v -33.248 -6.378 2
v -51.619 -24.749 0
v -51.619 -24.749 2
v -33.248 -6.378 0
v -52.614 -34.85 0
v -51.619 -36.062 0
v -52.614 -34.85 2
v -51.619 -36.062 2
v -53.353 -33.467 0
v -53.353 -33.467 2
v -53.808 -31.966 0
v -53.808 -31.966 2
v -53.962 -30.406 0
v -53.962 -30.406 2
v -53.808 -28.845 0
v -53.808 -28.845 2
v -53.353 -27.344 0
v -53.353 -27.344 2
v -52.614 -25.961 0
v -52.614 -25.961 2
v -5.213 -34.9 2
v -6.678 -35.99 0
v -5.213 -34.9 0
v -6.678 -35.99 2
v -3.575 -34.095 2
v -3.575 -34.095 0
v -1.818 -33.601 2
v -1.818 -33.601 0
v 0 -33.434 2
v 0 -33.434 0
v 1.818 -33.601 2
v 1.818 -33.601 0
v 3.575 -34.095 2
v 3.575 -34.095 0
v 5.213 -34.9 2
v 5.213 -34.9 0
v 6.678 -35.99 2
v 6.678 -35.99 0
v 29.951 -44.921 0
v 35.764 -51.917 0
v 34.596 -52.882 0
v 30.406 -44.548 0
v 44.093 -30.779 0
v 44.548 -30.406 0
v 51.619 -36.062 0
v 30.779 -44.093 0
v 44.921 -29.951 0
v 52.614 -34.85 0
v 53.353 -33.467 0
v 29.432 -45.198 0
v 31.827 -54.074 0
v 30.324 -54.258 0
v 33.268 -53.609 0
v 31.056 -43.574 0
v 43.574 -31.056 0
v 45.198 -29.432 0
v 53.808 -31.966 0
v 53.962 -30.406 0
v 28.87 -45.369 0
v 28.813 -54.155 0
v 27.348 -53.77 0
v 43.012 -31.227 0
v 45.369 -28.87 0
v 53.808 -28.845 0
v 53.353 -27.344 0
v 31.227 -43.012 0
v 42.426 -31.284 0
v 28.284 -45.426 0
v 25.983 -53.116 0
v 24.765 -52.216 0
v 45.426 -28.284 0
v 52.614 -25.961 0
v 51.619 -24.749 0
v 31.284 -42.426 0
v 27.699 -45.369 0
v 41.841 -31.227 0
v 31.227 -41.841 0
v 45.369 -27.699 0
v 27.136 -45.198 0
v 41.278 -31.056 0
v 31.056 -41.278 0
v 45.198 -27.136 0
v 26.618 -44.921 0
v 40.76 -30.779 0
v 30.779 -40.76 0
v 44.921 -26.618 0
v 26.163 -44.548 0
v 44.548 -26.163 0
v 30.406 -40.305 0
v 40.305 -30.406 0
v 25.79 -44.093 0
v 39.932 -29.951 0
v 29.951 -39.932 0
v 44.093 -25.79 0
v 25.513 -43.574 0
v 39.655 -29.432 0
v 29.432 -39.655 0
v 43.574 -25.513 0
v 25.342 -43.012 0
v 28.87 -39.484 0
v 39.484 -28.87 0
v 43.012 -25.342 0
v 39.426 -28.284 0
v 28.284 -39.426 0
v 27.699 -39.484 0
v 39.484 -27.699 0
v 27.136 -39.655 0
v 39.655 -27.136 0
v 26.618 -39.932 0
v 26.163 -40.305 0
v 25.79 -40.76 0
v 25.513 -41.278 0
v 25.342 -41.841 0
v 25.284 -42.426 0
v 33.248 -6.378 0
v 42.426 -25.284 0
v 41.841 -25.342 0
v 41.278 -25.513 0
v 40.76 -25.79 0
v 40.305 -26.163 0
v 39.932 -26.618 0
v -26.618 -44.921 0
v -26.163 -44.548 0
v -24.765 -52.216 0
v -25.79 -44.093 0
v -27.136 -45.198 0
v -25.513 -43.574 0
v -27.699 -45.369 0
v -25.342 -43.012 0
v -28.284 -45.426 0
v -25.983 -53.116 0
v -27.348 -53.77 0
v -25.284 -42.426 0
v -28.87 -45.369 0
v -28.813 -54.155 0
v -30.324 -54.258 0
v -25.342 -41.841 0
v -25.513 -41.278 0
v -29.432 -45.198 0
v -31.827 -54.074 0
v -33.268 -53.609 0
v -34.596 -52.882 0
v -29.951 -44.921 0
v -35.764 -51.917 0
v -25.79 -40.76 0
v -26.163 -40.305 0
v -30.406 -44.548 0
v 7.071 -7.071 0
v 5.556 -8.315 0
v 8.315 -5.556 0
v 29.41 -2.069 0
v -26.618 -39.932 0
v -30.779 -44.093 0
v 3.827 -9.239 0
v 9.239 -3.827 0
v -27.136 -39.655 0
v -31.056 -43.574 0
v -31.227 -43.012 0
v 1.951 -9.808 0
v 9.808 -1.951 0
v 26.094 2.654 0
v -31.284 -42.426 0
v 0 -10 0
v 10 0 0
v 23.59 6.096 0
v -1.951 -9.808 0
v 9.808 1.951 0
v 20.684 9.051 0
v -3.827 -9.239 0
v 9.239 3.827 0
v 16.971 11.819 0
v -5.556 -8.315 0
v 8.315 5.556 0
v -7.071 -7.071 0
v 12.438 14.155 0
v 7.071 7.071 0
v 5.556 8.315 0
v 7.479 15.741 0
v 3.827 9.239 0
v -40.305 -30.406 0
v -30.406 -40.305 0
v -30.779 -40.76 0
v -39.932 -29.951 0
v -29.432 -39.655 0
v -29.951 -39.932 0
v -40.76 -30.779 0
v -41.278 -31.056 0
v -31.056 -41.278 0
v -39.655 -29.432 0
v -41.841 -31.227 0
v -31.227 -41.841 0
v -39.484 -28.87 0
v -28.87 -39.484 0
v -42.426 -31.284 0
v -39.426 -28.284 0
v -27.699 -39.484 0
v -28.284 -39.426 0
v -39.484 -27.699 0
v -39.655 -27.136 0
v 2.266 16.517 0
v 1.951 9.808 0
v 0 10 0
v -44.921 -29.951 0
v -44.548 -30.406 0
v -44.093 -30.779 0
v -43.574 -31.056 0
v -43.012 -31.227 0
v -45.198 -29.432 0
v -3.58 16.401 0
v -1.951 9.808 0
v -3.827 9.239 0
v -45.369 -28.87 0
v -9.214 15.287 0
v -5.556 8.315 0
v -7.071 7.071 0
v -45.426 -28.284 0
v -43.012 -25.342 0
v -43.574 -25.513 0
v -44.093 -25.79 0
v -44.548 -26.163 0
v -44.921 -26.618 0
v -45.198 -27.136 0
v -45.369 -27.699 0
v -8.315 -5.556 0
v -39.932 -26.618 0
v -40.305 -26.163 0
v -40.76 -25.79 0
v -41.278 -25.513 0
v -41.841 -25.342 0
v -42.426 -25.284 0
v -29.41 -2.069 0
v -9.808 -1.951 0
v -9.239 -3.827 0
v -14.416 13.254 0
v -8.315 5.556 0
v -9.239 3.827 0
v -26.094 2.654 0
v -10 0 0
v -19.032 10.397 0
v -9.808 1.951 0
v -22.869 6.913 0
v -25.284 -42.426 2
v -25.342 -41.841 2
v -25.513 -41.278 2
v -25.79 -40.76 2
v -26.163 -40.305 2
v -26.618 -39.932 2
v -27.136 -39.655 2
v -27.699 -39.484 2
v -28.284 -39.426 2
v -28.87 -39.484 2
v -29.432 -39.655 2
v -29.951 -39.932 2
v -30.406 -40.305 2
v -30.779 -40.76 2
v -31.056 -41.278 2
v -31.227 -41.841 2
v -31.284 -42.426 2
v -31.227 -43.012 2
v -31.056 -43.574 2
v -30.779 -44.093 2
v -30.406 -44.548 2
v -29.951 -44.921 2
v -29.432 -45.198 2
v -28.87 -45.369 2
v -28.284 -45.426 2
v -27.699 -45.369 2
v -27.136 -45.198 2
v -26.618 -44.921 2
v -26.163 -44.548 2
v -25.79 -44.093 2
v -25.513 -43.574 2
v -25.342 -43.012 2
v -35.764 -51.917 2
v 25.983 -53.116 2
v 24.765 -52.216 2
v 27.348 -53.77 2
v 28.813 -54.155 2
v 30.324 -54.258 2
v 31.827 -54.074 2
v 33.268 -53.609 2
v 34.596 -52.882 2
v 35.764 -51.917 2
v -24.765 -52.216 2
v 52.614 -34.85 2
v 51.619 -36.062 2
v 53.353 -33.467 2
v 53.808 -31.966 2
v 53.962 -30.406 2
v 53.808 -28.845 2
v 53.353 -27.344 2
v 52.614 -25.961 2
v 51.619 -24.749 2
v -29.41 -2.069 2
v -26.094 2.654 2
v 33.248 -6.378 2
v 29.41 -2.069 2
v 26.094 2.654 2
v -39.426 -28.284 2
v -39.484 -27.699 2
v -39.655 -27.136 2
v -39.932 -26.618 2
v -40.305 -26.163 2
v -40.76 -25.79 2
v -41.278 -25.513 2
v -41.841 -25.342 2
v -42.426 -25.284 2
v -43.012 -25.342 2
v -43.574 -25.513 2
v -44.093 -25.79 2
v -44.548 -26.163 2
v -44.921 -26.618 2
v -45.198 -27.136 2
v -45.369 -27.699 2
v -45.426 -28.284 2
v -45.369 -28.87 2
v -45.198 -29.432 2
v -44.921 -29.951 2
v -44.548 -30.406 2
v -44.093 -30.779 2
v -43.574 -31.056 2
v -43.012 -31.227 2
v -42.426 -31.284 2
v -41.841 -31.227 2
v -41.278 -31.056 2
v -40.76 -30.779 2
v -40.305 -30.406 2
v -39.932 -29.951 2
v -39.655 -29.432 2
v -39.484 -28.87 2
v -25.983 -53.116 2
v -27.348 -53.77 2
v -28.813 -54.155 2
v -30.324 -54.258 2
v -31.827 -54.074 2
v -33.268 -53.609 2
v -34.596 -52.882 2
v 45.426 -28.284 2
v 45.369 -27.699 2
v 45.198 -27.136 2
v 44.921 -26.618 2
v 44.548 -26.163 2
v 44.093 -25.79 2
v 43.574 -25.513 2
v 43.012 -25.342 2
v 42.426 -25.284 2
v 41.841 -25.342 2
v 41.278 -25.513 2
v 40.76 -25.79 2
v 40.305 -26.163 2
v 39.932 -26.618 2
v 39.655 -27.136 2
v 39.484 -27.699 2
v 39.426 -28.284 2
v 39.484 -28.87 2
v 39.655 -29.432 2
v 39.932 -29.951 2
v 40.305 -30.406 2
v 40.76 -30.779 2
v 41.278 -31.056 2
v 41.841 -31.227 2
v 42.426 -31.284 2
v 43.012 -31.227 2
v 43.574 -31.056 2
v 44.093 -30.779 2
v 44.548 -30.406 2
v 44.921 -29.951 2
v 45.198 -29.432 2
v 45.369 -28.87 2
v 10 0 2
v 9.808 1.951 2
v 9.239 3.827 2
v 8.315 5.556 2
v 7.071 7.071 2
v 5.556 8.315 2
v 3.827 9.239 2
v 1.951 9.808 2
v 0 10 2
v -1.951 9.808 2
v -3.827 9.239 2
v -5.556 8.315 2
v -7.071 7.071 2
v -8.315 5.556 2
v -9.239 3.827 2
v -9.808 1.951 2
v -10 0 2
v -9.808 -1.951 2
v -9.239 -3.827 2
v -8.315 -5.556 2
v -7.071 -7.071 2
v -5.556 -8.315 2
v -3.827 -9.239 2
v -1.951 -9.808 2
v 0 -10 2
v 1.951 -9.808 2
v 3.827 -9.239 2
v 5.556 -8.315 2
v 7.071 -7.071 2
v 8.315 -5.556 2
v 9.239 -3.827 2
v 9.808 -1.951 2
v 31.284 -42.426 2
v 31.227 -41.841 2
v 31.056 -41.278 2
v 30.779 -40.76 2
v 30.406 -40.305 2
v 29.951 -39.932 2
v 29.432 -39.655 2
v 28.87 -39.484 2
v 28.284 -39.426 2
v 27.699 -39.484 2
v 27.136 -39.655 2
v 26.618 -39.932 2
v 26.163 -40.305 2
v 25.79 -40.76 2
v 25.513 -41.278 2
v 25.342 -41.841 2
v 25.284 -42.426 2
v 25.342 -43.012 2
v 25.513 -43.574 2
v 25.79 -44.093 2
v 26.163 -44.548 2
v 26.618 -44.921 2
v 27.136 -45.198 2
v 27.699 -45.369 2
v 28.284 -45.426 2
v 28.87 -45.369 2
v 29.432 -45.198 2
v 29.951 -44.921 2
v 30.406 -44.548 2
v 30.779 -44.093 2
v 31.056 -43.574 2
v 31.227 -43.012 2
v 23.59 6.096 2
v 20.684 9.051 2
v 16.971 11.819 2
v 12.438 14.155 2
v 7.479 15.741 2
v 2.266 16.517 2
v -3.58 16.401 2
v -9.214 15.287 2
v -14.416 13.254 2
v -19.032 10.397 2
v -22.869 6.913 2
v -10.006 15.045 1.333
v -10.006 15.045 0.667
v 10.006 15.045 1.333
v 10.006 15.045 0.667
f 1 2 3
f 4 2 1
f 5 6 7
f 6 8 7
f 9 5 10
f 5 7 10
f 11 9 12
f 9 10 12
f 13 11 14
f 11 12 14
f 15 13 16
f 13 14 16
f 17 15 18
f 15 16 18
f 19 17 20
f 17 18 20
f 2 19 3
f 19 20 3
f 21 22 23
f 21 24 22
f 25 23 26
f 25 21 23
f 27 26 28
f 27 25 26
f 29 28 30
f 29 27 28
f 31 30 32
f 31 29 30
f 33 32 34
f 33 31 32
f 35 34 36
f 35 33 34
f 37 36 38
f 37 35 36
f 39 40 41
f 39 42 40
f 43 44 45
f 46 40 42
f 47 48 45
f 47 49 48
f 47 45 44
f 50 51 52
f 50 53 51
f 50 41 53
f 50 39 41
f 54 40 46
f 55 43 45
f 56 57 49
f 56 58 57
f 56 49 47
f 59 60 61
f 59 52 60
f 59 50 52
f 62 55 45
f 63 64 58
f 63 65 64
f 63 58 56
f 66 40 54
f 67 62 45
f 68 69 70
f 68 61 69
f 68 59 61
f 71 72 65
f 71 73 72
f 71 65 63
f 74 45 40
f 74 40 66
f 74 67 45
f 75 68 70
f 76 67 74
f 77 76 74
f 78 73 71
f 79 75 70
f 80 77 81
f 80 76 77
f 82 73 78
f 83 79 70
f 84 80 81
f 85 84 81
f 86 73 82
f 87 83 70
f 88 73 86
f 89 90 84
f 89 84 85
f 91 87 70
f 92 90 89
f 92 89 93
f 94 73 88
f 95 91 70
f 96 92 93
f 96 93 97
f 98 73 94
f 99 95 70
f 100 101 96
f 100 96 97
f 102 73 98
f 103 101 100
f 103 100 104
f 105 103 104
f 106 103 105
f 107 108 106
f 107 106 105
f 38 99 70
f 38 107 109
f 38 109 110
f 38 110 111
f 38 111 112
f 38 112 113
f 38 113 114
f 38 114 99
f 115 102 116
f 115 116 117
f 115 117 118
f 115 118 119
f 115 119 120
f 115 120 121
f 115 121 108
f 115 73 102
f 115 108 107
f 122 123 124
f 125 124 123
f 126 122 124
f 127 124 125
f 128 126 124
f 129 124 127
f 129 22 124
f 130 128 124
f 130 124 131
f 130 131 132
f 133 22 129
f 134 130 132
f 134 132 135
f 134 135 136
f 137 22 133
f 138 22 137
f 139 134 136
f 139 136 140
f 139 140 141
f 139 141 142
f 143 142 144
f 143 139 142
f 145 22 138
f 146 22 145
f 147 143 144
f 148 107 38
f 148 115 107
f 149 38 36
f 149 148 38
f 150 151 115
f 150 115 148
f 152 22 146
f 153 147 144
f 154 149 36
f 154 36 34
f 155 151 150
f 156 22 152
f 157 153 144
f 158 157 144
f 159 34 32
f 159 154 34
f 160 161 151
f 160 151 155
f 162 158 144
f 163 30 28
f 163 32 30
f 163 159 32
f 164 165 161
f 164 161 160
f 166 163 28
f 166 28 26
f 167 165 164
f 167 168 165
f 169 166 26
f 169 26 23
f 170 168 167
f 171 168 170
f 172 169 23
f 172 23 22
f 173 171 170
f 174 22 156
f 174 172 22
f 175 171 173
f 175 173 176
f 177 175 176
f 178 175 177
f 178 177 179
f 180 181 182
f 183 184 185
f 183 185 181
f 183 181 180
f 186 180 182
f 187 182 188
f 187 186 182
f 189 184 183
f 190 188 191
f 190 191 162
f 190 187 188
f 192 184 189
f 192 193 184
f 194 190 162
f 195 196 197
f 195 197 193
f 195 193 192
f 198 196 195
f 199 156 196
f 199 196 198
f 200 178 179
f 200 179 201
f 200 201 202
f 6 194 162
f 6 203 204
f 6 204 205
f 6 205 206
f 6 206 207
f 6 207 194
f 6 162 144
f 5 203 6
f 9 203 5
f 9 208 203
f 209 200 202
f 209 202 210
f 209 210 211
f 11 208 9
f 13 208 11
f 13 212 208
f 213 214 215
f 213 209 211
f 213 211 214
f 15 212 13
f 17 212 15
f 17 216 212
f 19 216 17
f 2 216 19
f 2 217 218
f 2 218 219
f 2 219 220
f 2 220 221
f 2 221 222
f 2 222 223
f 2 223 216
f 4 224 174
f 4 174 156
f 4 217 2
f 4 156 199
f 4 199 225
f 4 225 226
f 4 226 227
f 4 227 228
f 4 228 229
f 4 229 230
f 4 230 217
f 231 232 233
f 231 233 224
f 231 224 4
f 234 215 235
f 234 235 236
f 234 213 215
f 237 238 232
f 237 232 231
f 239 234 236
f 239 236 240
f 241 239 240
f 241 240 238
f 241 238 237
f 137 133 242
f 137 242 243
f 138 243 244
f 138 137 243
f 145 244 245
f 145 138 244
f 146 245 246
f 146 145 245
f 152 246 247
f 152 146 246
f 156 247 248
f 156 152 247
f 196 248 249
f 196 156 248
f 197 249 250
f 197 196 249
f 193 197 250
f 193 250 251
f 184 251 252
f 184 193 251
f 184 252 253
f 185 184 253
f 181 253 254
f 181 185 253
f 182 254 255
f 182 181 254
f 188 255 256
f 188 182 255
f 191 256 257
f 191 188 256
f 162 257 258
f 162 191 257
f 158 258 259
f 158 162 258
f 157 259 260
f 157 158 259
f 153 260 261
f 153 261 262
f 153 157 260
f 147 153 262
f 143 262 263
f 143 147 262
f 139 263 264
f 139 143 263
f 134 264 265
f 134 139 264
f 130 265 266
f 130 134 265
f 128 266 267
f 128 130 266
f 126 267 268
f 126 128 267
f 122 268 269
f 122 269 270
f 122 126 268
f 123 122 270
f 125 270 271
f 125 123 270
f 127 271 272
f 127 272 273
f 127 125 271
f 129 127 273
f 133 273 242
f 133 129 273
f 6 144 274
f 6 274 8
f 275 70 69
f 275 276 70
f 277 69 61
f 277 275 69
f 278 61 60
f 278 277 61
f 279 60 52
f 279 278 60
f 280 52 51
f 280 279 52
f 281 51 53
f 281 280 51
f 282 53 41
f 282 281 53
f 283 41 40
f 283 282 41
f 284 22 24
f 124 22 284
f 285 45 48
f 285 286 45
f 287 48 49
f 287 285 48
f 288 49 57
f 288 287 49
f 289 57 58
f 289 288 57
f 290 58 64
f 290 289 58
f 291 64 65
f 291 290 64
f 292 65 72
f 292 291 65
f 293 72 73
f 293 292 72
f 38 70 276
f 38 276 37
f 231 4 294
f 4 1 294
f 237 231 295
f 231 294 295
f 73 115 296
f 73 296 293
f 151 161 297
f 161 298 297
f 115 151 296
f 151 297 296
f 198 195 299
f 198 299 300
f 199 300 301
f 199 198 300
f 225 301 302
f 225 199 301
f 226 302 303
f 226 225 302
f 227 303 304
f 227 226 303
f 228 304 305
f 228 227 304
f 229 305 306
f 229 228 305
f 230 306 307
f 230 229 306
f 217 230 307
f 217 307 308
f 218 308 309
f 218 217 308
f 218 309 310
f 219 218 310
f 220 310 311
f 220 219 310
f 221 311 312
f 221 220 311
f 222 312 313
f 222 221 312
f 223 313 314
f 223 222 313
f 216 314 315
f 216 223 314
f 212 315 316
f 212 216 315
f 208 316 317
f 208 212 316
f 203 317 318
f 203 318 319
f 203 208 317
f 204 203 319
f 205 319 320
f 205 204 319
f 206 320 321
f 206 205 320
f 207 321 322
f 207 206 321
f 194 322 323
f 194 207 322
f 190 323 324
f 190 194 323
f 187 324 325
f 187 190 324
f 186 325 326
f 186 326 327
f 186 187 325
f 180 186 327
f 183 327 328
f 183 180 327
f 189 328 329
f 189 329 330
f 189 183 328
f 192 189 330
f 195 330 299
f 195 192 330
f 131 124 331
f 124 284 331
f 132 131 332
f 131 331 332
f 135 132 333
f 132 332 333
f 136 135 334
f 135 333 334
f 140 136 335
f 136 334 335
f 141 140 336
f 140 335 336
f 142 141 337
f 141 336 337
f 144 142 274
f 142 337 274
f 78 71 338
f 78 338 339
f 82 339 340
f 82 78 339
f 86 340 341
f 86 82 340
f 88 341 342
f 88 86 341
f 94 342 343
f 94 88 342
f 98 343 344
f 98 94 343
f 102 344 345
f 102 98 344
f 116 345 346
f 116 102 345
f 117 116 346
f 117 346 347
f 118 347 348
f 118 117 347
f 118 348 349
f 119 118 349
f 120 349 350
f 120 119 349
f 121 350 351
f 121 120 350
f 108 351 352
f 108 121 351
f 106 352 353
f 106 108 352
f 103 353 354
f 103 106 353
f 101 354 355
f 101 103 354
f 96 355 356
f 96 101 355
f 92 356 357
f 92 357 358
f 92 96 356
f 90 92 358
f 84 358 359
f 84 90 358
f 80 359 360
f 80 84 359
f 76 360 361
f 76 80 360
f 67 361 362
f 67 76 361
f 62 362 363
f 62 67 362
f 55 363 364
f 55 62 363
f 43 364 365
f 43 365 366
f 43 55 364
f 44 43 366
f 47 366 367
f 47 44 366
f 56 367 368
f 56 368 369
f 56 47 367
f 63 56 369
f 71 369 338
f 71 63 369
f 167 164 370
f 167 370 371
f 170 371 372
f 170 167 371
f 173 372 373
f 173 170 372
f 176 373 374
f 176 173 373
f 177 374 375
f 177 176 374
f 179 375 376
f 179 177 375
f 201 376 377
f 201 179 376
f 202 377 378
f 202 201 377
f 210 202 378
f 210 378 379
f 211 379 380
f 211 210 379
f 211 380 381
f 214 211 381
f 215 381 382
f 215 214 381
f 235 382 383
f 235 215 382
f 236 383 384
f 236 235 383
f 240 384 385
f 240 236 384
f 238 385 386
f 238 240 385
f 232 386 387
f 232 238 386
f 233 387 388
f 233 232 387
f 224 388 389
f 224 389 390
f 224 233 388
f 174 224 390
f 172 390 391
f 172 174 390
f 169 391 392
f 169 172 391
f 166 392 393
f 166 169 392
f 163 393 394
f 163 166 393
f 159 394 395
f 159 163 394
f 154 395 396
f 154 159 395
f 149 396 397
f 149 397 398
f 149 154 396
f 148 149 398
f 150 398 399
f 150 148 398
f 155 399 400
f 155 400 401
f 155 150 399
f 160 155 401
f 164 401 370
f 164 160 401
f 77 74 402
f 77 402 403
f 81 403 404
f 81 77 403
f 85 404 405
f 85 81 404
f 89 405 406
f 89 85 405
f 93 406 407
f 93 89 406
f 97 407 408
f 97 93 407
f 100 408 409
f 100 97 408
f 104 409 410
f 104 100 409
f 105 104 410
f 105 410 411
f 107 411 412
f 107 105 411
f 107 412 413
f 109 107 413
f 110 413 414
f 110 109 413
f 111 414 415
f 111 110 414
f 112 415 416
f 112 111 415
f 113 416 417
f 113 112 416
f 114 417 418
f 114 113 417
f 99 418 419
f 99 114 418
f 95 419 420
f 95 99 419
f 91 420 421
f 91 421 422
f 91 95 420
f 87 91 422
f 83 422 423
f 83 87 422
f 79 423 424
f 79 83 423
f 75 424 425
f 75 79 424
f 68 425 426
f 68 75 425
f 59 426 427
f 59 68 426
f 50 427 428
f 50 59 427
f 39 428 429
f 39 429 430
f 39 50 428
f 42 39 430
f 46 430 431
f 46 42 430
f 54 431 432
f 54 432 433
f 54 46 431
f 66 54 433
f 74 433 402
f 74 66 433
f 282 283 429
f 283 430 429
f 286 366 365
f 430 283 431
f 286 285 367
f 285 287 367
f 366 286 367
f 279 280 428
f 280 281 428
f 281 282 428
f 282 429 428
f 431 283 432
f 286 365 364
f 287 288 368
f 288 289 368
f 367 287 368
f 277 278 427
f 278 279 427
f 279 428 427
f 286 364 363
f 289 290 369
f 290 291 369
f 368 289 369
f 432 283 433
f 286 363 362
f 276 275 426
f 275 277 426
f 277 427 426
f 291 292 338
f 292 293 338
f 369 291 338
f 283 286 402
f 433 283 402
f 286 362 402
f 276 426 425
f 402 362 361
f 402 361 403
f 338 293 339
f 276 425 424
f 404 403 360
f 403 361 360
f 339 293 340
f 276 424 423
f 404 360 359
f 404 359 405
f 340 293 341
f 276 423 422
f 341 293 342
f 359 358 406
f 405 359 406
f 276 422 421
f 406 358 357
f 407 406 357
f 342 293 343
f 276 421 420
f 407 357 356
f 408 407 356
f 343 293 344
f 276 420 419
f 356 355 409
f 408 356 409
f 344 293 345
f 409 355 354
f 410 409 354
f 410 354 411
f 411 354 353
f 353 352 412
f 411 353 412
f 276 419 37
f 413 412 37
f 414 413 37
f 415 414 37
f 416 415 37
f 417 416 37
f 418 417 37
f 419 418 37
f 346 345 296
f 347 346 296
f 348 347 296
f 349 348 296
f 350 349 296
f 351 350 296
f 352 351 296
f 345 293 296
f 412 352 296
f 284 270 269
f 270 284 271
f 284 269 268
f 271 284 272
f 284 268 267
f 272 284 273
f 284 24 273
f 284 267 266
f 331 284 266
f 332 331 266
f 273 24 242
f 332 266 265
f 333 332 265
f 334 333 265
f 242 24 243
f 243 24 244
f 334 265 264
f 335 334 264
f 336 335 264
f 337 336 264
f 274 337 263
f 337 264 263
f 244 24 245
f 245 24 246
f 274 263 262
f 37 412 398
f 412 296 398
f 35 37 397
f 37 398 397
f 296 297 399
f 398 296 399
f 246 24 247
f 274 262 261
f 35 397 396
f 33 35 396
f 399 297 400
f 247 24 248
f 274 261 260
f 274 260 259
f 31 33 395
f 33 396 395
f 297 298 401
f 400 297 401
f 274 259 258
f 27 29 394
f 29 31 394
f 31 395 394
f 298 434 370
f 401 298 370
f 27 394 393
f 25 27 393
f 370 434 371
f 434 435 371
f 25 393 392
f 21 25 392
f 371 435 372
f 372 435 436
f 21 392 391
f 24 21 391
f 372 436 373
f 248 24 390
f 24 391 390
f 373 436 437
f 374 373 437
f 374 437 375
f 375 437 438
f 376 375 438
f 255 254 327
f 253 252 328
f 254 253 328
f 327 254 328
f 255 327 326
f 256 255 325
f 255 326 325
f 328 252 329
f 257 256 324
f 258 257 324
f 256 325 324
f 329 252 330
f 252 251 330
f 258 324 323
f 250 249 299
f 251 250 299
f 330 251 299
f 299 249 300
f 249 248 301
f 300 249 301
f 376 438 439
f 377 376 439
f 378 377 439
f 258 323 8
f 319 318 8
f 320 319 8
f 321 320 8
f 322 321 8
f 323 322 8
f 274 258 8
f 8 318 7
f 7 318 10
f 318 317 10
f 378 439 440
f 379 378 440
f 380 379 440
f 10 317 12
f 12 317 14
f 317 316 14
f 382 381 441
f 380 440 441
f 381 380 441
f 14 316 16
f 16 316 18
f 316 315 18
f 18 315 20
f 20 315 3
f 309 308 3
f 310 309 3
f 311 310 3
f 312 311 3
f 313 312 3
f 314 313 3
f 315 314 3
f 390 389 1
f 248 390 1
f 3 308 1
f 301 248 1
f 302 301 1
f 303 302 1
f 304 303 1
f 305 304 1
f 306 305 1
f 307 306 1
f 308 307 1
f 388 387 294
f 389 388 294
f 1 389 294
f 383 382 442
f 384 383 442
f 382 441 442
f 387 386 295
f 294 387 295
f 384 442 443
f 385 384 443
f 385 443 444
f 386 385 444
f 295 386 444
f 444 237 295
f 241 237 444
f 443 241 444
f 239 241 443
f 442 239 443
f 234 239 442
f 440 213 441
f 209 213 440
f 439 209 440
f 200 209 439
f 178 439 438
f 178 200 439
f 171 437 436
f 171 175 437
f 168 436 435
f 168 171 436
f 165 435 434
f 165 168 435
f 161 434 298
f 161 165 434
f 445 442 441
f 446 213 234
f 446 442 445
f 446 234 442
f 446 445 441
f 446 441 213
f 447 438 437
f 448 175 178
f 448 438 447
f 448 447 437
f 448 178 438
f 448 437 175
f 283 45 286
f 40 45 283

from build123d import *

# Parameters (mm, degrees)
SKETCH1_R           = 10
SKETCH1_R_2         = 3
BOSS_EXTRUDE1_DEPTH = 2
FILLET1_R           = 10
FILLET2_R           = 8
FILLET3_R           = 50


with BuildPart() as part:
    # Sketch1 → Boss-Extrude1 (new body)
    with BuildSketch(Plane.XY):
        with BuildLine():
            Line((-57.275649276, -30.405591591), (-28.125846456, -1.255788771))
            add(Edge.make_bspline(
                [(-28.125846456, -1.255788771), (-17.904305408, 22.543934761), (17.904305408, 22.543934761), (28.125846456, -1.255788771)],
                knots=[0, 0, 0, 0, 1, 1, 1, 1], degree=3))
            Line((28.125846456, -1.255788771), (57.275649276, -30.405591591))
            Line((57.275649276, -30.405591591), (30.405591591, -57.275649276))
            Line((30.405591591, -57.275649276), (0, -30))
            Line((0, -30), (-30.405591591, -57.275649276))
            Line((-30.405591591, -57.275649276), (-57.275649276, -30.405591591))
        make_face()
        Circle(SKETCH1_R, mode=Mode.SUBTRACT)
        with Locations((-42.426406871, -28.284271247)):
            Circle(SKETCH1_R_2, mode=Mode.SUBTRACT)
        with Locations((-28.284271247, -42.426406871)):
            Circle(SKETCH1_R_2, mode=Mode.SUBTRACT)
        with Locations((28.284271247, -42.426406871)):
            Circle(SKETCH1_R_2, mode=Mode.SUBTRACT)
        with Locations((42.426406871, -28.284271247)):
            Circle(SKETCH1_R_2, mode=Mode.SUBTRACT)
    extrude(amount=BOSS_EXTRUDE1_DEPTH)

    # Fillet1
    fillet1_edges = [part.edges().sort_by_distance(p)[0] for p in [
        (0, -30, 1),
    ]]
    fillet(fillet1_edges, radius=FILLET1_R)

    # Fillet2
    fillet2_edges = [part.edges().sort_by_distance(p)[0] for p in [
        (-57.275649276, -30.405591591, 1),
        (57.275649276, -30.405591591, 1),
        (30.405591591, -57.275649276, 1),
        (-30.405591591, -57.275649276, 1),
    ]]
    fillet(fillet2_edges, radius=FILLET2_R)

    # Fillet3
    fillet3_edges = [part.edges().sort_by_distance(p)[0] for p in [
        (-28.125846456, -1.255788771, 1),
        (28.125846456, -1.255788771, 1),
    ]]
    fillet(fillet3_edges, radius=FILLET3_R)


solid = part.part
